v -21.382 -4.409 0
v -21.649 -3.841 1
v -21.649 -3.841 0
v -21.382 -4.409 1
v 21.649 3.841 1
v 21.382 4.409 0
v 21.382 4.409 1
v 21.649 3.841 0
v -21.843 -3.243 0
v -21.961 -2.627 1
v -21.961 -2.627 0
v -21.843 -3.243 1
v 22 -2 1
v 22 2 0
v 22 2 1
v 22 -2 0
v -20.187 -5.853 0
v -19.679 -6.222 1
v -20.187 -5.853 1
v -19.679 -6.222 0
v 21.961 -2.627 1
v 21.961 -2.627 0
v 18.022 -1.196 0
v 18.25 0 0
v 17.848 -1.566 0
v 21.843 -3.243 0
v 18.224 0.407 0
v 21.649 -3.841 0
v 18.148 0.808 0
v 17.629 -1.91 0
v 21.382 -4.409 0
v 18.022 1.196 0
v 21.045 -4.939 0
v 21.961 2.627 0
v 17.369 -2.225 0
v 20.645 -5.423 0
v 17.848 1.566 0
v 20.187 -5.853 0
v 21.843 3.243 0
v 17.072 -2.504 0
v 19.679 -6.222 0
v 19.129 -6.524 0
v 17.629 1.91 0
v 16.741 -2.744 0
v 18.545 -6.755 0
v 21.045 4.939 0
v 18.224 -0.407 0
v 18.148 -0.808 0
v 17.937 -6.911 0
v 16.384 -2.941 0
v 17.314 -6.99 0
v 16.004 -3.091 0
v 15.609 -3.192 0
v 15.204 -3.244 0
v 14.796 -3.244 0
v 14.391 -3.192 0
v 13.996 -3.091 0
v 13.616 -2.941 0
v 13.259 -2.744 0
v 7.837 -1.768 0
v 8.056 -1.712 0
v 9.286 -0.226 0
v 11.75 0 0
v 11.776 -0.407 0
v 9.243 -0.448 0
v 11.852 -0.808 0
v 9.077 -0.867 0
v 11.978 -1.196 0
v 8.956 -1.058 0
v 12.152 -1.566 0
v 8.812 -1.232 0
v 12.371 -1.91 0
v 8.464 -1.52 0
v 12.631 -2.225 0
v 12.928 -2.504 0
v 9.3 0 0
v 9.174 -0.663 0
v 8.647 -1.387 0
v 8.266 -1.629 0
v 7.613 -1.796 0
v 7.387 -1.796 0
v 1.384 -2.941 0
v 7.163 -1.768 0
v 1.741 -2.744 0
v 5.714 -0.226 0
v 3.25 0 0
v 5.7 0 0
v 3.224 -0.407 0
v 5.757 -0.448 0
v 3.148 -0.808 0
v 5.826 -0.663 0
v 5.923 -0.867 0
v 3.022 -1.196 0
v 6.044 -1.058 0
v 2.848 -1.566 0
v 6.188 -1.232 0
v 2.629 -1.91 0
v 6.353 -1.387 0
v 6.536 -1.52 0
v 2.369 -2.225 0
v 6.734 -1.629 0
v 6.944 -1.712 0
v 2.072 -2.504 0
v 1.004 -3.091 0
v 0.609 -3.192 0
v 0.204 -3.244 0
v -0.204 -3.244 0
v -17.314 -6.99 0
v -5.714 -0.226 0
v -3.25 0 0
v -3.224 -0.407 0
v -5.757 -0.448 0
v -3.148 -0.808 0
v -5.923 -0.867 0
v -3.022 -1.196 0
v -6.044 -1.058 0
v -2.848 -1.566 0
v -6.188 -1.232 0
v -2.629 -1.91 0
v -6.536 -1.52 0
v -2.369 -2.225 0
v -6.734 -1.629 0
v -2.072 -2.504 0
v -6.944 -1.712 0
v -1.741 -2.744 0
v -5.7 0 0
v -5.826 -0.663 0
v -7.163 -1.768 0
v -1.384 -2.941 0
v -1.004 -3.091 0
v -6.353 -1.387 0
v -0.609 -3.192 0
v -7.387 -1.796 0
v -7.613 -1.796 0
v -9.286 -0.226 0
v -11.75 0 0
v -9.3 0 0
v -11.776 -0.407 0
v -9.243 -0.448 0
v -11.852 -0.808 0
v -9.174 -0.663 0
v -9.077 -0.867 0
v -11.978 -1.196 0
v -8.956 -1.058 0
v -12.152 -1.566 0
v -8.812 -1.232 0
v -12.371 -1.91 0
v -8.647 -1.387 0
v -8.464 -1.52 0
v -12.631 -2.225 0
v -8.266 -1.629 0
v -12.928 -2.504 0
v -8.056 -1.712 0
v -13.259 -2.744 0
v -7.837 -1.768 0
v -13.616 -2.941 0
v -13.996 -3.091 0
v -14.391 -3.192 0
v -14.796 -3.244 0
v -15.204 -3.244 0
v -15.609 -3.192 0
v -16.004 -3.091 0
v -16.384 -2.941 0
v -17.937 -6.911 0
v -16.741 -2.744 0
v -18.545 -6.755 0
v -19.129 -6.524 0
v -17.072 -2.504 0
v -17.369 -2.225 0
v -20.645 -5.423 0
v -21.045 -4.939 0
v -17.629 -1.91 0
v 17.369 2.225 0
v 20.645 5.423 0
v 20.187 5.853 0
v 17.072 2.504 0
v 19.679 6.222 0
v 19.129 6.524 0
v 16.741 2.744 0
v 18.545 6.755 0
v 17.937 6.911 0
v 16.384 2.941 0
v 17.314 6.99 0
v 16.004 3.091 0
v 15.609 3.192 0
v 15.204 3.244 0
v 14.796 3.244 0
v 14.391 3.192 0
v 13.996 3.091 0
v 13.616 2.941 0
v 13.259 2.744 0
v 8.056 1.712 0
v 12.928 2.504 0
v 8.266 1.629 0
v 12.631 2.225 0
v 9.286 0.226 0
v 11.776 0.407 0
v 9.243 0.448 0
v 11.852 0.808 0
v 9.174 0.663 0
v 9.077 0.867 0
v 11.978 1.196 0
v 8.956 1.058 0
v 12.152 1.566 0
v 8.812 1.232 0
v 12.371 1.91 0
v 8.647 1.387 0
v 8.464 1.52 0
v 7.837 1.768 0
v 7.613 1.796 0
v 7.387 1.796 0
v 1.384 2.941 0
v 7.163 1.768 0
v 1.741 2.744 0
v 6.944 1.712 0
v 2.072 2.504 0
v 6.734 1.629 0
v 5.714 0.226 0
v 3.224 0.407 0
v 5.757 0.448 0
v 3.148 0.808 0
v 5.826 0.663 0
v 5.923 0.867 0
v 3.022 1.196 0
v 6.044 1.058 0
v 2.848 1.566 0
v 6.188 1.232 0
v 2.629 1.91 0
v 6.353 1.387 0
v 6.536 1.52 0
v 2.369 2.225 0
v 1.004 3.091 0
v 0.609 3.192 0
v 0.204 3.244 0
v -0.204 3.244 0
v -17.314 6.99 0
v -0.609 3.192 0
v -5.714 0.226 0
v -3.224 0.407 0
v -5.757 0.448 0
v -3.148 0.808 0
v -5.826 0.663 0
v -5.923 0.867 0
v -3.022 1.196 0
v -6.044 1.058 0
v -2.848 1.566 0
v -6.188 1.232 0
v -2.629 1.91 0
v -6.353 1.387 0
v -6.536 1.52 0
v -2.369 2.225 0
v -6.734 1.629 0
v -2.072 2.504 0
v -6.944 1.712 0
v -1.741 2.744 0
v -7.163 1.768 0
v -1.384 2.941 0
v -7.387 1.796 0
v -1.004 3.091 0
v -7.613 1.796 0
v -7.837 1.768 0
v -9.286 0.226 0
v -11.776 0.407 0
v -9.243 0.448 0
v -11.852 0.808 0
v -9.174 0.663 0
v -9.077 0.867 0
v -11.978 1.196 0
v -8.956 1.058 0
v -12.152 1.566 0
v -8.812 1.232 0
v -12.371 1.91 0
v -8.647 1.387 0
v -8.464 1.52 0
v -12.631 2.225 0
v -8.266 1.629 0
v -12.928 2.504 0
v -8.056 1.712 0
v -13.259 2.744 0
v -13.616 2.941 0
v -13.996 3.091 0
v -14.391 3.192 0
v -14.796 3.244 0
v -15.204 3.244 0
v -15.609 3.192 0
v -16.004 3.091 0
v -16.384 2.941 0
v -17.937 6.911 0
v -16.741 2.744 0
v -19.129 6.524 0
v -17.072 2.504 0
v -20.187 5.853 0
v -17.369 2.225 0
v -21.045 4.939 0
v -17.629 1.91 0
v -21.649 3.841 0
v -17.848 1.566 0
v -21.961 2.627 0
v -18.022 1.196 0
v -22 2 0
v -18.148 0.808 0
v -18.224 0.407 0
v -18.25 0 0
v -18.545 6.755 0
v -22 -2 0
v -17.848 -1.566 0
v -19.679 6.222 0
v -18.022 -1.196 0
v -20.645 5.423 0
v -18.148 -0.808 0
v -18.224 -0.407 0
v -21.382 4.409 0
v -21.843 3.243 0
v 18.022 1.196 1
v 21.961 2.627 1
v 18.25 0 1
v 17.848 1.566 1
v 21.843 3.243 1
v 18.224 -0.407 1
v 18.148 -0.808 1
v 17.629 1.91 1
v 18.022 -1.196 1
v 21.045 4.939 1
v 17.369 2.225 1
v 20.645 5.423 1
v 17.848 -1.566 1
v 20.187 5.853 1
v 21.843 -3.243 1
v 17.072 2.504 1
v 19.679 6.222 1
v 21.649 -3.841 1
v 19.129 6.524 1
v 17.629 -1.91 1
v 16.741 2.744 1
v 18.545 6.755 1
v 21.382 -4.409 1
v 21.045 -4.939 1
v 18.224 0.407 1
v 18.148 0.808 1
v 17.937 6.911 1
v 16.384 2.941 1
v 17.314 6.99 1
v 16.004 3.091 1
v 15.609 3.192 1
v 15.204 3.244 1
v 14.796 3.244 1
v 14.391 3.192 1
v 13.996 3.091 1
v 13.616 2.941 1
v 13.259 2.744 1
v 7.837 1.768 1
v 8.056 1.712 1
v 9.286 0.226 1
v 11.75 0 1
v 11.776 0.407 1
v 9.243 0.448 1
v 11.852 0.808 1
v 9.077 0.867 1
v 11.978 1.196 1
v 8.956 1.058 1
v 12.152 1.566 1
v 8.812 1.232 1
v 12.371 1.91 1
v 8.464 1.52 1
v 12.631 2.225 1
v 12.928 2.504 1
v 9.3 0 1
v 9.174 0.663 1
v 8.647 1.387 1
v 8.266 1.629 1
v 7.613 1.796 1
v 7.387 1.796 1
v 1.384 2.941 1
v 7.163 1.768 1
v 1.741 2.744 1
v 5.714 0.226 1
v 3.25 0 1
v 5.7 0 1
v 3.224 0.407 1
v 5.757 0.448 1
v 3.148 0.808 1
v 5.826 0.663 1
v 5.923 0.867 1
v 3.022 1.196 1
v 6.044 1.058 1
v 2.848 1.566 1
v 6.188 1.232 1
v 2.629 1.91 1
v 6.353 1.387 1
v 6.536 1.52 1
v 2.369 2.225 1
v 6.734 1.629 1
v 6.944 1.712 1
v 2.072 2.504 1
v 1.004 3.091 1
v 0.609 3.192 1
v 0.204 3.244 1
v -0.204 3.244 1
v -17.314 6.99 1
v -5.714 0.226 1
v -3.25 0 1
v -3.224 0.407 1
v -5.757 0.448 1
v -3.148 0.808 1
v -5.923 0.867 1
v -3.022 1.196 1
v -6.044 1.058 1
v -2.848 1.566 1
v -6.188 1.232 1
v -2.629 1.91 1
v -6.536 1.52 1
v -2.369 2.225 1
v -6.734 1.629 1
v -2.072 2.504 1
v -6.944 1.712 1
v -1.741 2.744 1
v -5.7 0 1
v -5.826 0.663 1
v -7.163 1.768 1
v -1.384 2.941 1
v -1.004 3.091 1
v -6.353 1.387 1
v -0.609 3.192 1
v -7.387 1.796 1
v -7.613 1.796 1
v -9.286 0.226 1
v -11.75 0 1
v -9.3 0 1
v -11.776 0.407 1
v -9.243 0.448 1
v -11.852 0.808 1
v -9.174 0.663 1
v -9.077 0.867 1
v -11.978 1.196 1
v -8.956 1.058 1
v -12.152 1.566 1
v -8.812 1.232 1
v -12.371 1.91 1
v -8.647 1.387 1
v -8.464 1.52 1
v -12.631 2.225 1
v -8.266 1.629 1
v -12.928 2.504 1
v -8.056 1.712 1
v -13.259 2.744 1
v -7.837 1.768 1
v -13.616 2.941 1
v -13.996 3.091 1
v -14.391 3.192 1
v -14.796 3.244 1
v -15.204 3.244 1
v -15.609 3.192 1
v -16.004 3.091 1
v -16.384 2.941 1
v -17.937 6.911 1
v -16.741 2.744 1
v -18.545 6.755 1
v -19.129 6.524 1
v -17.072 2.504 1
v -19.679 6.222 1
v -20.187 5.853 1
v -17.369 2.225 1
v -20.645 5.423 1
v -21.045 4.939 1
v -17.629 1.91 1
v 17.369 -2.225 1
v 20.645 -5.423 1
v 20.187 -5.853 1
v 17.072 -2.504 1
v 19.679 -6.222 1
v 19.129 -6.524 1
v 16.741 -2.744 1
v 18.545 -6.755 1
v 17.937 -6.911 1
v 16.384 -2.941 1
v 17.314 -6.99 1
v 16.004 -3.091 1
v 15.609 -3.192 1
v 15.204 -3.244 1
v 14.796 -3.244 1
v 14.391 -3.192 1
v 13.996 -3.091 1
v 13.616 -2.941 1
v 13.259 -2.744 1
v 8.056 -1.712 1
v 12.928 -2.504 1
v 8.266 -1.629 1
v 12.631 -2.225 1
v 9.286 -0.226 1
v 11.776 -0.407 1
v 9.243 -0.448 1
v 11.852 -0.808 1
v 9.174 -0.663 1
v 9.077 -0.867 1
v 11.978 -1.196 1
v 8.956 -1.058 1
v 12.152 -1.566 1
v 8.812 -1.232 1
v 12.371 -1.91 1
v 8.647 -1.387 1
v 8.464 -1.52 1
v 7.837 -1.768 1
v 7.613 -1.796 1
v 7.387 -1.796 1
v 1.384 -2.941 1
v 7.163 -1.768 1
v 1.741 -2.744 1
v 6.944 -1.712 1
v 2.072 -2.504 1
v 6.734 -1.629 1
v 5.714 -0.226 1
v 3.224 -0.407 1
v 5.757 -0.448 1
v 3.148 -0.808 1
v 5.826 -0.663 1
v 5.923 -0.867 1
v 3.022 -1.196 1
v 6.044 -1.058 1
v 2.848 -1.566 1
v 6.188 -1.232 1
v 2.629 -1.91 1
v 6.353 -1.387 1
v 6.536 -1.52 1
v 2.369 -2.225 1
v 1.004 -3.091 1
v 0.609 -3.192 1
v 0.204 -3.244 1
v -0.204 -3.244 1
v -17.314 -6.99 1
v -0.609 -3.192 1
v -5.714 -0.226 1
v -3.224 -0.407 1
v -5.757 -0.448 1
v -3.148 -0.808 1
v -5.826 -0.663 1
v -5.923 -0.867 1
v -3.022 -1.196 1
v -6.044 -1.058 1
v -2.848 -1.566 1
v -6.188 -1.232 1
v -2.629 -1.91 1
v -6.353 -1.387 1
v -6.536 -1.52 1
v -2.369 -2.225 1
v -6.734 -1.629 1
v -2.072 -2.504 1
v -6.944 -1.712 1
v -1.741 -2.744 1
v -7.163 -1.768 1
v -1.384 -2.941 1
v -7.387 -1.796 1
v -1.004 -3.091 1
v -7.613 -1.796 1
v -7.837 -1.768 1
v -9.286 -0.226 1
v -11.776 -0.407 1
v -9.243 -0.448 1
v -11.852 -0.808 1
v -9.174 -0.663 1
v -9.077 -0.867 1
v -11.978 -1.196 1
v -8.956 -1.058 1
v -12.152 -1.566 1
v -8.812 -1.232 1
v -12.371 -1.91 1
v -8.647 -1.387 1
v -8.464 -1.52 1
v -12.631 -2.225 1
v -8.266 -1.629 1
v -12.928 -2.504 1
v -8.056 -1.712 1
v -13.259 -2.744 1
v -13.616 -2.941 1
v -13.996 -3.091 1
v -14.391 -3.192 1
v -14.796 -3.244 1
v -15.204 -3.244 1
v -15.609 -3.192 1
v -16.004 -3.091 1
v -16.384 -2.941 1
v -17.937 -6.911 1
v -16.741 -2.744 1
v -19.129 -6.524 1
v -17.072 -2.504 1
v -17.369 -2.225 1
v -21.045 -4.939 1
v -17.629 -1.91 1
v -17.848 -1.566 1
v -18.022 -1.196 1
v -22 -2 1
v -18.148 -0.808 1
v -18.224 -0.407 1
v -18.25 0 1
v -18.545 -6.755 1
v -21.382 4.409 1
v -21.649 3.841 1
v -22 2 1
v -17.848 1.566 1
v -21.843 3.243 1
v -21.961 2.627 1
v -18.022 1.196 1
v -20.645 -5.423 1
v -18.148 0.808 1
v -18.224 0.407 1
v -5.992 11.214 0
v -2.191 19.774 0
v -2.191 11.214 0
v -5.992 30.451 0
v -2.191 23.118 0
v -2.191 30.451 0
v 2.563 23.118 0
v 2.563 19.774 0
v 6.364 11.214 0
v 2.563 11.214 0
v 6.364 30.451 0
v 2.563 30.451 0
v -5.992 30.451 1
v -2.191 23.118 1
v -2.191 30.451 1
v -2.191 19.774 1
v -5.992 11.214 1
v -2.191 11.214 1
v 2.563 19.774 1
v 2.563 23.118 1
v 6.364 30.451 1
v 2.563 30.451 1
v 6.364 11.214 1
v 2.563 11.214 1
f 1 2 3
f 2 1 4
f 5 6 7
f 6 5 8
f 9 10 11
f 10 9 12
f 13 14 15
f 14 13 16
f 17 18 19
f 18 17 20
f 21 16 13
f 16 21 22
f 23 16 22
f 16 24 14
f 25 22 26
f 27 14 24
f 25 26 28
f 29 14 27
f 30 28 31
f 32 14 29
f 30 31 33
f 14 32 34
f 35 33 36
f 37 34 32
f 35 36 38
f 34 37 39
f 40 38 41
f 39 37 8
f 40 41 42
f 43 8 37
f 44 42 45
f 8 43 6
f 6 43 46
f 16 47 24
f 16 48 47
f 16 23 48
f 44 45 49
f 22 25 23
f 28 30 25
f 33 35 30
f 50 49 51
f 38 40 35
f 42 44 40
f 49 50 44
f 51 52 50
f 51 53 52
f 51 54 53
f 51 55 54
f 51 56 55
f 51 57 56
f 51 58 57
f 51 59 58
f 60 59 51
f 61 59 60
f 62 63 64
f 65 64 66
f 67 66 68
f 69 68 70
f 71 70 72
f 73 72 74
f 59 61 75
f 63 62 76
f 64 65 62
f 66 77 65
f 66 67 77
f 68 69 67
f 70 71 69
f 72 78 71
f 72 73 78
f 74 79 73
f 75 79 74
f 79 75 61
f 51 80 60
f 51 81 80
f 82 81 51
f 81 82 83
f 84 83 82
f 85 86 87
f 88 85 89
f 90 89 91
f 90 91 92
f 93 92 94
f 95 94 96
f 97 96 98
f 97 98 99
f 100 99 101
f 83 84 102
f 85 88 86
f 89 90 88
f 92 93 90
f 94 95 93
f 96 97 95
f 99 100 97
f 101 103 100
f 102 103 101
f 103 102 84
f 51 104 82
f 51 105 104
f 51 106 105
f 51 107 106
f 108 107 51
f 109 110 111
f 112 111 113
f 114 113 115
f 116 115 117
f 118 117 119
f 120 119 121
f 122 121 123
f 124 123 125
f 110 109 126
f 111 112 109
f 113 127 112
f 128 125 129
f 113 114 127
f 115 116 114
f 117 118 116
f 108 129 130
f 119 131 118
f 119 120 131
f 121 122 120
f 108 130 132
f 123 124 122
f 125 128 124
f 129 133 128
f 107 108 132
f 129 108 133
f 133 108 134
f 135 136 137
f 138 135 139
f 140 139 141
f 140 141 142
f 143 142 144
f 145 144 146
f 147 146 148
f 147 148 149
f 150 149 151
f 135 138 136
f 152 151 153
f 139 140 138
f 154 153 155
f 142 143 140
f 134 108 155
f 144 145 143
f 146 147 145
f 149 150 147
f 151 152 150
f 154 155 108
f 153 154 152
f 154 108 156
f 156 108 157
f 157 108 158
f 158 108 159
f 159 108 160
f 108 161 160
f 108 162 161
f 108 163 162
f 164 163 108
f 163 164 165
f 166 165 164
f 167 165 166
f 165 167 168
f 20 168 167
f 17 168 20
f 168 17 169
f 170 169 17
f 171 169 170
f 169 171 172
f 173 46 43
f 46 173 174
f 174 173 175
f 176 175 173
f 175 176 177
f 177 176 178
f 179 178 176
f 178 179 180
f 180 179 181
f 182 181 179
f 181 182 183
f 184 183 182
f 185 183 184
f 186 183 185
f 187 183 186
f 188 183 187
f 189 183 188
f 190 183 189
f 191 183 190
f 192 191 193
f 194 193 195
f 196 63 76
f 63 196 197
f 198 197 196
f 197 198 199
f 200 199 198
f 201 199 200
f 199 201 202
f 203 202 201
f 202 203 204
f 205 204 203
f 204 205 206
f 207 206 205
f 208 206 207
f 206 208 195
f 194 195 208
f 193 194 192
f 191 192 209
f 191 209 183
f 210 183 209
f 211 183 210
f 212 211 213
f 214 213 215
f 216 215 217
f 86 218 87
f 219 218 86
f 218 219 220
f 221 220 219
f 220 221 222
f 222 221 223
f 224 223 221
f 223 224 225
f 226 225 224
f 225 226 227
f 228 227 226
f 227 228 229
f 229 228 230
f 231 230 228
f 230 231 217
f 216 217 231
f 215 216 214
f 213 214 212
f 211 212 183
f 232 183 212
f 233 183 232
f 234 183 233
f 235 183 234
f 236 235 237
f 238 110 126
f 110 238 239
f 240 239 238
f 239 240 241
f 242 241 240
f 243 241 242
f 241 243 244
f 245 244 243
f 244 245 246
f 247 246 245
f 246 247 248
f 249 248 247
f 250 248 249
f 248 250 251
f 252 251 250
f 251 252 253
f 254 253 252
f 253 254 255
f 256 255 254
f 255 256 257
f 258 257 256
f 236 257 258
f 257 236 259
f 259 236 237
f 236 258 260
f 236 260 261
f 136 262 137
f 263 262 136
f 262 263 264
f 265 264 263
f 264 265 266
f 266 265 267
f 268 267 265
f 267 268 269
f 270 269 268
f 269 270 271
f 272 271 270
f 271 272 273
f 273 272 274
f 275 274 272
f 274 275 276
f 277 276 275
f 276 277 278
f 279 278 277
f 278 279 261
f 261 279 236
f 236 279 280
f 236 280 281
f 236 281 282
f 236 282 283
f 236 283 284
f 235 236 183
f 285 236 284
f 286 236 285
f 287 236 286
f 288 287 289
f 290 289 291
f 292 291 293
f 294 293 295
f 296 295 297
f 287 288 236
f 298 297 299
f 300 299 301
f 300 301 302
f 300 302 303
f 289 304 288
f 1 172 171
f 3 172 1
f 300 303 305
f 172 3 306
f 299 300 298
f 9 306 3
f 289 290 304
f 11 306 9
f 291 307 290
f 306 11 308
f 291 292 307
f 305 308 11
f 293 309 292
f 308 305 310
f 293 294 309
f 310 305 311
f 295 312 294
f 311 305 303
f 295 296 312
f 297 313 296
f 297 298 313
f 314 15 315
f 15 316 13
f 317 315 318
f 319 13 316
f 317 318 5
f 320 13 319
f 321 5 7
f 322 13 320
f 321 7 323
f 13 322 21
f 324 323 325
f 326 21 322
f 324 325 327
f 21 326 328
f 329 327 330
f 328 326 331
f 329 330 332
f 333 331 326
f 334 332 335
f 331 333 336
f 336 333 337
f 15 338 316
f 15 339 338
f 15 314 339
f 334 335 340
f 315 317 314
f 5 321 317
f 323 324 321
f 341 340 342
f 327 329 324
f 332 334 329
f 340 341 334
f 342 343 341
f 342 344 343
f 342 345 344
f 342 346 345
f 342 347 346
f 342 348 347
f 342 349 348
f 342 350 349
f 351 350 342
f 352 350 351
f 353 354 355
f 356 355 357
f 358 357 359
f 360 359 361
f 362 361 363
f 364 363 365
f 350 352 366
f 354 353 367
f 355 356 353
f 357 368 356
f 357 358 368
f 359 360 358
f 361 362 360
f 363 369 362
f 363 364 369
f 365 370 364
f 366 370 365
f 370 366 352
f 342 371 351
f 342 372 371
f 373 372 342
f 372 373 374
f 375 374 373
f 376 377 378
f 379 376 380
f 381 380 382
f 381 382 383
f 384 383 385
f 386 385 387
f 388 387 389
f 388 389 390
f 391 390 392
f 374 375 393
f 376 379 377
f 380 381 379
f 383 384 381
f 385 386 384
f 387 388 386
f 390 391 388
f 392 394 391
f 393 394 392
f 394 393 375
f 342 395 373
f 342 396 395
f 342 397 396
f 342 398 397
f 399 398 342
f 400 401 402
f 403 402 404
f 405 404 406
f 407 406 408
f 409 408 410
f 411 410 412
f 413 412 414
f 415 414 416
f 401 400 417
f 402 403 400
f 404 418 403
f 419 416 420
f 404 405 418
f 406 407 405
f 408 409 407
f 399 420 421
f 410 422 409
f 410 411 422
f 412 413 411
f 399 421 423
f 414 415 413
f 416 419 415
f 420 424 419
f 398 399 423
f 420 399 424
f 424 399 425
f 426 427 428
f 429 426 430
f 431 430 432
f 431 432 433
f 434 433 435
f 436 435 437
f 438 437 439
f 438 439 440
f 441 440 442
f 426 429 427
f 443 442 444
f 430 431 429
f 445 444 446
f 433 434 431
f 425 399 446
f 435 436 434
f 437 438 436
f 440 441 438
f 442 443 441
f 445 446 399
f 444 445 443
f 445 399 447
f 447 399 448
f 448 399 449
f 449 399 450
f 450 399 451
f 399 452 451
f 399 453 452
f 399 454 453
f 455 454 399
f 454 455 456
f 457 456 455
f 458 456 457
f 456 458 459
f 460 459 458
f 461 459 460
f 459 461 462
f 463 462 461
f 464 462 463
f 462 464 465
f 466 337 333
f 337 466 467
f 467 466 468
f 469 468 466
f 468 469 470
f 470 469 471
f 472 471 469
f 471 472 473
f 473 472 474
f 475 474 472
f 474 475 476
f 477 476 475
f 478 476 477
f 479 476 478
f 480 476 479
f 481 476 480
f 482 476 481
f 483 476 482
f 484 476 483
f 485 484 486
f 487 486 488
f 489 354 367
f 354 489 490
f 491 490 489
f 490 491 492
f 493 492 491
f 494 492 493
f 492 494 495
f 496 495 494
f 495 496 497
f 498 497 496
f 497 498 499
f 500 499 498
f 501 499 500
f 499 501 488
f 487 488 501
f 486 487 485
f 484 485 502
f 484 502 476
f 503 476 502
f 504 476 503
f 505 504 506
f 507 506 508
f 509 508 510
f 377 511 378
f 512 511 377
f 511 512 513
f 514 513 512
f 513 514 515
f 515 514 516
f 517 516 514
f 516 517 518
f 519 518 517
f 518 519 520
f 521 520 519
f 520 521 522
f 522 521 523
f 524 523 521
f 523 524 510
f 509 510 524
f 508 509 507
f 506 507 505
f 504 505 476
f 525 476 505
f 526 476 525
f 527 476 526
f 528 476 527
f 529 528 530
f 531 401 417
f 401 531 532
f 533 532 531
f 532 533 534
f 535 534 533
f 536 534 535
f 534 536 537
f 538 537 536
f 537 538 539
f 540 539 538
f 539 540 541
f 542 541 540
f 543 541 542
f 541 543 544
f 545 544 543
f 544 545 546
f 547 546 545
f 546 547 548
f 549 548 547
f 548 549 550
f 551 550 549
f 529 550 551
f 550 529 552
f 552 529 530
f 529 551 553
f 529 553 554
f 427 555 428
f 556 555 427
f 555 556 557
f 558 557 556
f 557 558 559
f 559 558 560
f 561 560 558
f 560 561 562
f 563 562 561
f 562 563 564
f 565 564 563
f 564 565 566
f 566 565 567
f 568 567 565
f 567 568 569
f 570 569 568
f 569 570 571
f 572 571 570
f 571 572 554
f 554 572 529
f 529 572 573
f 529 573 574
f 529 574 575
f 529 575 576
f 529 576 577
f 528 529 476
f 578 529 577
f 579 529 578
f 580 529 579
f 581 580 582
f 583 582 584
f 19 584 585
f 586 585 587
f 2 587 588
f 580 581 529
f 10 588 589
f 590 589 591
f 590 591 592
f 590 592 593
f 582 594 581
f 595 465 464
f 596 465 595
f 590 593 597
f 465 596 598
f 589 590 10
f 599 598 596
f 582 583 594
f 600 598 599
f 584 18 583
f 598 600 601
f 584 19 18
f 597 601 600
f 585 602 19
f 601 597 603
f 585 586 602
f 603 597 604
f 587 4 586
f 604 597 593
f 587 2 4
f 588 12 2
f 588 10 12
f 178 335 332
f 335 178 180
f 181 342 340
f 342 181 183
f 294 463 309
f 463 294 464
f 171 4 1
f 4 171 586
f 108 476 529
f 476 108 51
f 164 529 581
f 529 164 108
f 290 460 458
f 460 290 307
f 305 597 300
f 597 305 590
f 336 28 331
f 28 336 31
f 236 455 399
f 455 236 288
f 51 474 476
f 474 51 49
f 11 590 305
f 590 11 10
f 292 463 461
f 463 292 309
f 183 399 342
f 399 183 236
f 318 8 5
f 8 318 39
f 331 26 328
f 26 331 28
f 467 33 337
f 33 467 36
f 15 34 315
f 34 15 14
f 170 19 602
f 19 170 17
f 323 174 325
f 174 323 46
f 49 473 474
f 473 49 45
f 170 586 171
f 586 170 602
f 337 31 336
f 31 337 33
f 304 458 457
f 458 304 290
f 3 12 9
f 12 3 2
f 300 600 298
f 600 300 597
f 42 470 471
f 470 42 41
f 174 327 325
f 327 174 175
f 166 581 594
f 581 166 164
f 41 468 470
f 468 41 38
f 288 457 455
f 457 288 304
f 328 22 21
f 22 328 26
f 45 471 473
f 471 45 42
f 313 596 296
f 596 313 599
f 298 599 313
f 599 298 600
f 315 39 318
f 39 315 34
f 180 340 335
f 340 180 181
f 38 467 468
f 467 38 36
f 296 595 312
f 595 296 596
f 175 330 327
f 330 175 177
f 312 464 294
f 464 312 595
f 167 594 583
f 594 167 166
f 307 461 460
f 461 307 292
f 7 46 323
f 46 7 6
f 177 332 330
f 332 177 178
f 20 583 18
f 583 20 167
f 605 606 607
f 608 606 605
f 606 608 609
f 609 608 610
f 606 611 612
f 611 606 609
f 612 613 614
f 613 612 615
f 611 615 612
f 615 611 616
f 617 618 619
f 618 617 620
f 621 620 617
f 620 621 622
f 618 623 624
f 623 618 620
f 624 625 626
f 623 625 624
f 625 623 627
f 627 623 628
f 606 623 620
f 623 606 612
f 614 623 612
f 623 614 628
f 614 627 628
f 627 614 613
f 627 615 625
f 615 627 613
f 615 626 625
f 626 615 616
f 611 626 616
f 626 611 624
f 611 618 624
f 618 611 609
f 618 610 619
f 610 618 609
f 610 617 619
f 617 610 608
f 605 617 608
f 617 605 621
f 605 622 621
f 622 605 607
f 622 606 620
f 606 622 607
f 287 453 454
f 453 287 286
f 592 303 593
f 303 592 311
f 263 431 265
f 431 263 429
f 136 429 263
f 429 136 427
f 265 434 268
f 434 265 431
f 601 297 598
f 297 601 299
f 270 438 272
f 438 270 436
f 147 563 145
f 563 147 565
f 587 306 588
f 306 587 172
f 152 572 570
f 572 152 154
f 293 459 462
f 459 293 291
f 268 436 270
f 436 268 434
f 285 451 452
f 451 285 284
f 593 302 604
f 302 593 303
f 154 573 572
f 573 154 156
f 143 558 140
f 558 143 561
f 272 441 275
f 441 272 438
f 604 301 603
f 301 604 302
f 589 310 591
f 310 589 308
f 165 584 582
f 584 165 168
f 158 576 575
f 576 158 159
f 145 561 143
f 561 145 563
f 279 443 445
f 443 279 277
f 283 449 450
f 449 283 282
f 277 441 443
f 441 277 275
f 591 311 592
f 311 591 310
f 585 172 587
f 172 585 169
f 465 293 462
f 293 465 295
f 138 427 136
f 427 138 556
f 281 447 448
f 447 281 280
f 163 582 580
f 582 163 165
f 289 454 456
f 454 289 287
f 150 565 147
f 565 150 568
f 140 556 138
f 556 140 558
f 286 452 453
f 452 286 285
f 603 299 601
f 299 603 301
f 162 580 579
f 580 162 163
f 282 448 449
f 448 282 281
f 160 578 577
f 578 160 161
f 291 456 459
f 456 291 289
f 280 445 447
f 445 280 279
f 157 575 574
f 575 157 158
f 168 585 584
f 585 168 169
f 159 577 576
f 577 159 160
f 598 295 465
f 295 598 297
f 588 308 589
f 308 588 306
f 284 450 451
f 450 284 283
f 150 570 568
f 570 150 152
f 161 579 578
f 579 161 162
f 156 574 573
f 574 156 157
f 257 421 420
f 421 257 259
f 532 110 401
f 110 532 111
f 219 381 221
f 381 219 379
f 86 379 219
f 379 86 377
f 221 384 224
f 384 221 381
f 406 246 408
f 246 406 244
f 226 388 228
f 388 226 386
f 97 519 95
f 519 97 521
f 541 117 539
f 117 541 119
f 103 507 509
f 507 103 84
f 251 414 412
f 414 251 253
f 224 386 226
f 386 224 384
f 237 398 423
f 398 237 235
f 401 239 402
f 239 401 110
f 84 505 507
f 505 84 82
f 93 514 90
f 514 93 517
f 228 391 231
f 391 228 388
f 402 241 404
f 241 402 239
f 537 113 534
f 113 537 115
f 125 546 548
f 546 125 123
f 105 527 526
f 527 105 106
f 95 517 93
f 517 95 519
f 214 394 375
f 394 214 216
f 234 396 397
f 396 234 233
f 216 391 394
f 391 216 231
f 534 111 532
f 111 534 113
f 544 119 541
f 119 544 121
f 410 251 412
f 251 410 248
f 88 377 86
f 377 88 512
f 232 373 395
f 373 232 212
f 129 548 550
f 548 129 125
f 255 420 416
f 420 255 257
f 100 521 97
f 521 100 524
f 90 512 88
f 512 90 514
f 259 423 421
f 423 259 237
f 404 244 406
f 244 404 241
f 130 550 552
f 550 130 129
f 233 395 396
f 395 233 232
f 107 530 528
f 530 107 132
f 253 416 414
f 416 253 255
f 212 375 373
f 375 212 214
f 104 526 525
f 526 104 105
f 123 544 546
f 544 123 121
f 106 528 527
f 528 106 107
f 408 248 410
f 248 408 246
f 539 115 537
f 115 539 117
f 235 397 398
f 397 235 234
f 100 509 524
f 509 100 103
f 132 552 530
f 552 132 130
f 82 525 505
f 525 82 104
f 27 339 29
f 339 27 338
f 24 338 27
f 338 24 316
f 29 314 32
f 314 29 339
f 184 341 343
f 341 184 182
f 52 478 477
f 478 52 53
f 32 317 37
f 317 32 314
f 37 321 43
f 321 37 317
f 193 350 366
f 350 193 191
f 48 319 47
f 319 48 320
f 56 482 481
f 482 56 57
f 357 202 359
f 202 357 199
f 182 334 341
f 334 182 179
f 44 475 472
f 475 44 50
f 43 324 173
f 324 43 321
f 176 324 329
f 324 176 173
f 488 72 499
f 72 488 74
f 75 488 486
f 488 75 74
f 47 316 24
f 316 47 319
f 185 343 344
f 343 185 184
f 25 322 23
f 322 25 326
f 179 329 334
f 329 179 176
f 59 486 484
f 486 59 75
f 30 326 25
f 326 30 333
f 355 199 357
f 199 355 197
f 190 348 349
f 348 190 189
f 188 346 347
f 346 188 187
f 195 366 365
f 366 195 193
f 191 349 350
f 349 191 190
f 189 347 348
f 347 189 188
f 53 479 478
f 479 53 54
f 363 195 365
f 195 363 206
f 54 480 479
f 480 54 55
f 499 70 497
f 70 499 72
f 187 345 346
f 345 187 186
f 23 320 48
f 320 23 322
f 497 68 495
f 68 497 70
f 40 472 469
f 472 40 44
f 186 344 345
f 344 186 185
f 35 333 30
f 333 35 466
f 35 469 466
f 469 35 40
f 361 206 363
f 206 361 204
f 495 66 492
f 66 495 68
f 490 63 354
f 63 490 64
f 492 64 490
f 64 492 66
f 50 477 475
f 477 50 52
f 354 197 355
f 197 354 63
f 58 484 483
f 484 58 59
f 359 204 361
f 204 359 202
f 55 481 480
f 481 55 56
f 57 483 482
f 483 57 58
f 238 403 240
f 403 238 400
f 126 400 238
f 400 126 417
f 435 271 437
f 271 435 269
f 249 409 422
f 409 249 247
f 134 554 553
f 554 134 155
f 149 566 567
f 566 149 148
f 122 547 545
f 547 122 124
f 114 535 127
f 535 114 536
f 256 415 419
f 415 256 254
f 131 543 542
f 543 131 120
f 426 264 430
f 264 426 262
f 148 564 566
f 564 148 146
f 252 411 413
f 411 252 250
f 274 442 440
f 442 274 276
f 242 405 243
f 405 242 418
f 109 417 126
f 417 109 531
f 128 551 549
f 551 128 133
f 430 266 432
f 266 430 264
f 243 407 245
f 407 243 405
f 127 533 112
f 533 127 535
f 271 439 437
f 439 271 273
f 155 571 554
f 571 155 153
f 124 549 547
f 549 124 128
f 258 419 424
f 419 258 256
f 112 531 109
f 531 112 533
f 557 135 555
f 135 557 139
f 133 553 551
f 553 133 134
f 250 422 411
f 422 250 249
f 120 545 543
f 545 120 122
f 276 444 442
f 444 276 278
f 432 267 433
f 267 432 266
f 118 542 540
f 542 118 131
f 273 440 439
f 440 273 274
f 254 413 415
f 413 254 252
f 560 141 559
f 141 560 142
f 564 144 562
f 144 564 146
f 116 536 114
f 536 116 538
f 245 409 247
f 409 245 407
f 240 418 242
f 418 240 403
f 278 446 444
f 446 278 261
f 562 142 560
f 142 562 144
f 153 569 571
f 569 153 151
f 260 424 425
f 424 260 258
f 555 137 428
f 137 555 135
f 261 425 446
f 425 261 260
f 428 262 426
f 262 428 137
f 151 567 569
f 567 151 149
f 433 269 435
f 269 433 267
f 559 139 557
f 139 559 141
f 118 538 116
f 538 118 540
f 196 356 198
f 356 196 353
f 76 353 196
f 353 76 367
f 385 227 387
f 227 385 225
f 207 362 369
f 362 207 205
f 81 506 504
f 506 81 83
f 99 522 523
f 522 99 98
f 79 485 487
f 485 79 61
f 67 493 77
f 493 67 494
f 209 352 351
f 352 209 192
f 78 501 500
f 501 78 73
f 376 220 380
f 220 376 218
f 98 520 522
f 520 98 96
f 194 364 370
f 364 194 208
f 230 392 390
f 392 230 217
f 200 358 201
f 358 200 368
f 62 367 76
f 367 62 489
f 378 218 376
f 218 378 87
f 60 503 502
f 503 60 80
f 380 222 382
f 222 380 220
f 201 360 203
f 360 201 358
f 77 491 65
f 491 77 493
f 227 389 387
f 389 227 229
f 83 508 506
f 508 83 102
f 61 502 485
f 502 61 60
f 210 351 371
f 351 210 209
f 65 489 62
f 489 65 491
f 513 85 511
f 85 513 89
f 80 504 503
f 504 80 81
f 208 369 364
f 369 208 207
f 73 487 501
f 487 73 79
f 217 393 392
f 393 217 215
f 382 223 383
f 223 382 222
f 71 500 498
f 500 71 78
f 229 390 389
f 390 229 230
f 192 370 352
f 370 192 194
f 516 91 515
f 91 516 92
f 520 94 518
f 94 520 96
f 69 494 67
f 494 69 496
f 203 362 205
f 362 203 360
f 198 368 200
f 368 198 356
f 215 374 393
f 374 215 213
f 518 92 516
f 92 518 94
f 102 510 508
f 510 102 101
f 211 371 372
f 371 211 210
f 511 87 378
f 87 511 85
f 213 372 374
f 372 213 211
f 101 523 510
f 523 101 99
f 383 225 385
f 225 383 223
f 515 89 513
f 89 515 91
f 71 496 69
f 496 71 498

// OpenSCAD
$fn = 50;


difference() {
	union() {
		hull() {
			translate(v = [-17.0000000000, 2.0000000000, 0]) {
				cylinder(h = 1, r = 5);
			}
			translate(v = [17.0000000000, 2.0000000000, 0]) {
				cylinder(h = 1, r = 5);
			}
			translate(v = [-17.0000000000, -2.0000000000, 0]) {
				cylinder(h = 1, r = 5);
			}
			translate(v = [17.0000000000, -2.0000000000, 0]) {
				cylinder(h = 1, r = 5);
			}
		}
		translate(v = [0, 30.0000000000, 0]) {
			linear_extrude(height = 1) {
				text(font = "DejaVu Sans Mono:style=Bold", halign = "center", size = 19.0000000000, text = "H", valign = "top");
			}
		}
	}
	union() {
		translate(v = [-15.0000000000, 0.0000000000, 0]) {
			translate(v = [0, 0, -100]) {
				cylinder(h = 200, r = 3.2500000000);
			}
		}
		translate(v = [0, 0, -100]) {
			cylinder(h = 200, r = 3.2500000000);
		}
		translate(v = [15.0000000000, 0.0000000000, 0]) {
			translate(v = [0, 0, -100]) {
				cylinder(h = 200, r = 3.2500000000);
			}
		}
		translate(v = [-15.0000000000, 0.0000000000, 0]) {
			translate(v = [0, 0, -100]) {
				cylinder(h = 200, r = 1.8000000000);
			}
		}
		translate(v = [-7.5000000000, 0.0000000000, 0]) {
			translate(v = [0, 0, -100]) {
				cylinder(h = 200, r = 1.8000000000);
			}
		}
		translate(v = [0, 0, -100]) {
			cylinder(h = 200, r = 1.8000000000);
		}
		translate(v = [7.5000000000, 0.0000000000, 0]) {
			translate(v = [0, 0, -100]) {
				cylinder(h = 200, r = 1.8000000000);
			}
		}
		translate(v = [15.0000000000, 0.0000000000, 0]) {
			translate(v = [0, 0, -100]) {
				cylinder(h = 200, r = 1.8000000000);
			}
		}
	}
}
